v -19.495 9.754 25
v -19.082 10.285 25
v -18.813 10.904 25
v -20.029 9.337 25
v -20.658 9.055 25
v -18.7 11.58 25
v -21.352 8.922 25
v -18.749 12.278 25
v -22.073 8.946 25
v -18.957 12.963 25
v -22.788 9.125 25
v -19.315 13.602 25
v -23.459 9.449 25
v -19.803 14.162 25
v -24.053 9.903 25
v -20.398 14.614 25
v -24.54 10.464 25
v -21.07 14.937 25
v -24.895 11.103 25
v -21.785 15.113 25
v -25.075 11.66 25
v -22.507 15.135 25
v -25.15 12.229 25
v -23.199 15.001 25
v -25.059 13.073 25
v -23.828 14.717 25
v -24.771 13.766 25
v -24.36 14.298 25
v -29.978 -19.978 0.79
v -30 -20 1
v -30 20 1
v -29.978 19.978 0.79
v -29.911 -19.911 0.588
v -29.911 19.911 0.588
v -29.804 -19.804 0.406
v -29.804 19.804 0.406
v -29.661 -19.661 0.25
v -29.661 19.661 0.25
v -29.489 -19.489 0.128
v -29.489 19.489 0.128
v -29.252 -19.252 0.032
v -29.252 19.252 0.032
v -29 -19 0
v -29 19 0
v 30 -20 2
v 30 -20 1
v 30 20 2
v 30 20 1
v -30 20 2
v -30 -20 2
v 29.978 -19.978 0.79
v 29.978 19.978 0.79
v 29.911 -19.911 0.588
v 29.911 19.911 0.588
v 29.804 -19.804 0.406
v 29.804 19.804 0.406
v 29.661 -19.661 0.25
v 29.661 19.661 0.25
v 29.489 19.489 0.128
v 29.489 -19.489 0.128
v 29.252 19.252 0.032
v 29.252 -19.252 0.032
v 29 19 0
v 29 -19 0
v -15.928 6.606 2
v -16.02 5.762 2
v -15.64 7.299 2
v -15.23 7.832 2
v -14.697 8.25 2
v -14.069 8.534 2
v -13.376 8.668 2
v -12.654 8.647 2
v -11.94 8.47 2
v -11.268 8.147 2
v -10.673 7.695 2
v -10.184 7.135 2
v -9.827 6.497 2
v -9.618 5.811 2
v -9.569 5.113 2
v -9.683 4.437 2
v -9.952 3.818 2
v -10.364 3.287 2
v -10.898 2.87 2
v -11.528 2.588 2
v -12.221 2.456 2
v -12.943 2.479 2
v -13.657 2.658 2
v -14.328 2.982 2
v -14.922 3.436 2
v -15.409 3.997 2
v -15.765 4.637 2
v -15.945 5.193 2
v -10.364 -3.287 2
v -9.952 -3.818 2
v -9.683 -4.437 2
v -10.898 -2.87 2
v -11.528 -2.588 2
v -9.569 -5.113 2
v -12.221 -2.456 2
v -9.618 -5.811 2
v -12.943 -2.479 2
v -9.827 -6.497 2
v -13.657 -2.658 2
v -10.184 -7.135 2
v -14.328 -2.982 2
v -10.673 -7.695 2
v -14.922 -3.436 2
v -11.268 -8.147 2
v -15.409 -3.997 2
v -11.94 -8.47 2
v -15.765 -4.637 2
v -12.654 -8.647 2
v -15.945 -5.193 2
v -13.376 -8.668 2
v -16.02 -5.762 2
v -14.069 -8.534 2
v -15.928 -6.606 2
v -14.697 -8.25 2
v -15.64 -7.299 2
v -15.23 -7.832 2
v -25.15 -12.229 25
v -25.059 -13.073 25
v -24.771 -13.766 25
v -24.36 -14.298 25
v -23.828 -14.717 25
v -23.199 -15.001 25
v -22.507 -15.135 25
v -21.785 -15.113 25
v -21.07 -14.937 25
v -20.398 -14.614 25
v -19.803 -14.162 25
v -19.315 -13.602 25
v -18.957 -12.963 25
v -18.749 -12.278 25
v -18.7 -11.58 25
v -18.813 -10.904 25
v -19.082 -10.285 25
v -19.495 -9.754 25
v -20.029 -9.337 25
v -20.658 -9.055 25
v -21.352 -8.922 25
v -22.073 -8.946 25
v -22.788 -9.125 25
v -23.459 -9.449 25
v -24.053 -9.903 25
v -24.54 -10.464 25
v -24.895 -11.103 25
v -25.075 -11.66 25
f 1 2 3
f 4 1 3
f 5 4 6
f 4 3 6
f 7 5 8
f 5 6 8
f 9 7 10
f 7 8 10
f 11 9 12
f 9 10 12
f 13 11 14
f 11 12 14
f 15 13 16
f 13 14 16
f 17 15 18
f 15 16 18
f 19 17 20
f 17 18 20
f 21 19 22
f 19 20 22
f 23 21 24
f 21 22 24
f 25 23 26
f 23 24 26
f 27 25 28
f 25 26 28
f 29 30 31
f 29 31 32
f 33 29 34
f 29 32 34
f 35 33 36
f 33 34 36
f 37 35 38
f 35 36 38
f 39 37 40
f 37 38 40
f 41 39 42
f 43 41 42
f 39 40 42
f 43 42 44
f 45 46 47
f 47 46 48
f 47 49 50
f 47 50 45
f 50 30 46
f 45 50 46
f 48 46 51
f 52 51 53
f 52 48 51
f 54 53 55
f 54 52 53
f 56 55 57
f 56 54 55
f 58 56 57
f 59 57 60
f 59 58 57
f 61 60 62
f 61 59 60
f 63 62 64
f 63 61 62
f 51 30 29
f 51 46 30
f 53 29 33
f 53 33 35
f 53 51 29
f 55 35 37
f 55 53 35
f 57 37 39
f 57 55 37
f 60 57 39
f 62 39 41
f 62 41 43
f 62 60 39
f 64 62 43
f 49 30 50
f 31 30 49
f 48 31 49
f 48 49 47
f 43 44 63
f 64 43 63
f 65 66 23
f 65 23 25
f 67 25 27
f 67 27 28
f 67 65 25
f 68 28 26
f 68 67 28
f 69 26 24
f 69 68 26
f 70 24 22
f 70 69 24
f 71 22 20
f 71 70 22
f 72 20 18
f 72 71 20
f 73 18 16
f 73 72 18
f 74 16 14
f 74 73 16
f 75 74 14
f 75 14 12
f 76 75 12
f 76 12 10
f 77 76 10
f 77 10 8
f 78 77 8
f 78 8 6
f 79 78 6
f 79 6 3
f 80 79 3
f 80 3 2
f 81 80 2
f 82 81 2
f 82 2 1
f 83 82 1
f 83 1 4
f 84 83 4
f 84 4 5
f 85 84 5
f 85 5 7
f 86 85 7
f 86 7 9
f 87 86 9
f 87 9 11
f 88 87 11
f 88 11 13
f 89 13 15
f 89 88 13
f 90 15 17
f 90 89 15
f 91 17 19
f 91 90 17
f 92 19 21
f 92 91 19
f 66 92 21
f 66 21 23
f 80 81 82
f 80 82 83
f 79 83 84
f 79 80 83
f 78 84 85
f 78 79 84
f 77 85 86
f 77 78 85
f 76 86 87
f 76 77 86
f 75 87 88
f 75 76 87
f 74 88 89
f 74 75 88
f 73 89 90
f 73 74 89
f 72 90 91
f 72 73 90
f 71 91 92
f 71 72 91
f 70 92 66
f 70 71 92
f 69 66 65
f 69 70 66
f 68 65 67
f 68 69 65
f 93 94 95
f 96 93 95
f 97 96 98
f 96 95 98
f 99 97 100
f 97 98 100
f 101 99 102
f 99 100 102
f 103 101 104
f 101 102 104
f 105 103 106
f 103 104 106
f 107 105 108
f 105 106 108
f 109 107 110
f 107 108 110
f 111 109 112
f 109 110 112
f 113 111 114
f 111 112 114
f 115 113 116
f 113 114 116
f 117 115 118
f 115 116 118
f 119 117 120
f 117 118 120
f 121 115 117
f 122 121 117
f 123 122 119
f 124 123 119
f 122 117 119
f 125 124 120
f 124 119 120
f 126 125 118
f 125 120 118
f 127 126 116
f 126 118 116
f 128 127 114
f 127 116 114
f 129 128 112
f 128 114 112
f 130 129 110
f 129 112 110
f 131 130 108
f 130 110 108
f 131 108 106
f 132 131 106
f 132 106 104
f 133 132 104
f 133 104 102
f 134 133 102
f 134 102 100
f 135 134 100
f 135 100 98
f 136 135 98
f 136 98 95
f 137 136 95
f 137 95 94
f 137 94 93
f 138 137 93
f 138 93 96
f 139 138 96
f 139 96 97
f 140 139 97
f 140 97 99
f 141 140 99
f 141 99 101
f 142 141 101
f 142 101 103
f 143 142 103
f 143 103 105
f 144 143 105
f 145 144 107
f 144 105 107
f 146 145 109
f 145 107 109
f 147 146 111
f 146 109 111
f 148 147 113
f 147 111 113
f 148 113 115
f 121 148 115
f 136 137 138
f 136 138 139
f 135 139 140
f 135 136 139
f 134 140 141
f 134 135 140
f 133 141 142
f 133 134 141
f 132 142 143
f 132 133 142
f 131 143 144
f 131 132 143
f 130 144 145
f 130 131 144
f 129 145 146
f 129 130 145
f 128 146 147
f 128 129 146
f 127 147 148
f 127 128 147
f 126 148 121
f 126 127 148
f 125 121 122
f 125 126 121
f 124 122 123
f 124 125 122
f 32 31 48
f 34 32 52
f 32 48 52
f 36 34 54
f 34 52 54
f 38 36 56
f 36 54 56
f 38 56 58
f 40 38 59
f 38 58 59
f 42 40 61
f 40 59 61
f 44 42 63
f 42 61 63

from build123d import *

# Parameters (mm, degrees)
BOX002_W                 = 60
BOX002_H                 = 40
BOX002_DEPTH             = 6
BOX001_W                 = 60
BOX001_H                 = 40
BOX001_DEPTH             = 4
CYLINDER_R               = 3
CYLINDER_DEPTH           = 30
CYLINDER_ROLL_ANGLE      = -15.421958
CYLINDER_PITCH_ANGLE     = 21.119305
CYLINDER_PLACEMENT_ANGLE = -2.129744
BOX_W                    = 60
BOX_H                    = 40
BOX_DEPTH                = 2
FILLET_R                 = 1


with BuildPart() as bordplade_cutter:
    # Box002 → Box002 (new body)
    with BuildSketch(Plane(origin=(-30, -20, -4), x_dir=(1, 0, 0), z_dir=(0, 0, 1))):
        with Locations((30, 20)):
            Rectangle(BOX002_W, BOX002_H)
    extrude(amount=BOX002_DEPTH)


with BuildPart() as gulc_cutter:
    # Box001 → Box001 (new body)
    with BuildSketch(Plane(origin=(-30, -20, 25), x_dir=(1, 0, 0), z_dir=(0, 0, 1))):
        with Locations((30, 20)):
            Rectangle(BOX001_W, BOX001_H)
    extrude(amount=BOX001_DEPTH)


with BuildPart() as ben1_cuttet_final:
    # Cylinder → Cylinder (new body)
    with BuildSketch(Plane.XY):
        Circle(CYLINDER_R)
    extrude(amount=CYLINDER_DEPTH)


with BuildPart() as ben1_cuttet_final_1:
    # Cylinder roll: moved
    add(ben1_cuttet_final.part.rotate(Axis((0, 0, 0), (1, 0, 0)), CYLINDER_ROLL_ANGLE))


with BuildPart() as ben1_cuttet_final_2:
    # Cylinder pitch: moved
    add(ben1_cuttet_final_1.part.rotate(Axis((0, 0, 0), (0, 1, 0)), CYLINDER_PITCH_ANGLE))


with BuildPart() as ben1_cuttet_final_3:
    # Cylinder placement: moved
    add(ben1_cuttet_final_2.part.moved(Location((12, 5, 0))).rotate(Axis((12, 5, 0), (0, 0, 1)), CYLINDER_PLACEMENT_ANGLE))

    # Cut: cut Gulc-cutter
    add(gulc_cutter.part, mode=Mode.SUBTRACT)

    # Cut001: cut Bordplade-cutter
    add(bordplade_cutter.part, mode=Mode.SUBTRACT)


with BuildPart() as part_mirroring001:
    # Part__Mirroring001: instance of ben1-cuttet-final
    add(ben1_cuttet_final_3.part.mirror(Plane(origin=(0, 0, 0), x_dir=(0, -1, 0), z_dir=(1, 0, 0))))


with BuildPart() as part_mirroring:
    # Part__Mirroring: instance of ben1-cuttet-final
    add(ben1_cuttet_final_3.part.mirror(Plane(origin=(0, 0, 0), x_dir=(1, 0, 0), z_dir=(0, 1, 0))))


with BuildPart() as part_mirroring002:
    # Part__Mirroring002: instance of Part__Mirroring
    add(part_mirroring.part.mirror(Plane(origin=(0, 0, 0), x_dir=(0, -1, 0), z_dir=(1, 0, 0))))


with BuildPart() as fillet_body:
    # Box → Box (new body)
    with BuildSketch(Plane(origin=(-30, -20, 0), x_dir=(1, 0, 0), z_dir=(0, 0, 1))):
        with Locations((30, 20)):
            Rectangle(BOX_W, BOX_H)
    extrude(amount=BOX_DEPTH)

    # Fillet
    fillet_edges = [fillet_body.edges().sort_by_distance(p)[0] for p in [
        (-30, 0, 0),
        (30, 0, 0),
        (0, -20, 0),
        (0, 20, 0),
    ]]
    fillet(fillet_edges, radius=FILLET_R)


solid = Compound([part_mirroring001.part, part_mirroring002.part, fillet_body.part])
